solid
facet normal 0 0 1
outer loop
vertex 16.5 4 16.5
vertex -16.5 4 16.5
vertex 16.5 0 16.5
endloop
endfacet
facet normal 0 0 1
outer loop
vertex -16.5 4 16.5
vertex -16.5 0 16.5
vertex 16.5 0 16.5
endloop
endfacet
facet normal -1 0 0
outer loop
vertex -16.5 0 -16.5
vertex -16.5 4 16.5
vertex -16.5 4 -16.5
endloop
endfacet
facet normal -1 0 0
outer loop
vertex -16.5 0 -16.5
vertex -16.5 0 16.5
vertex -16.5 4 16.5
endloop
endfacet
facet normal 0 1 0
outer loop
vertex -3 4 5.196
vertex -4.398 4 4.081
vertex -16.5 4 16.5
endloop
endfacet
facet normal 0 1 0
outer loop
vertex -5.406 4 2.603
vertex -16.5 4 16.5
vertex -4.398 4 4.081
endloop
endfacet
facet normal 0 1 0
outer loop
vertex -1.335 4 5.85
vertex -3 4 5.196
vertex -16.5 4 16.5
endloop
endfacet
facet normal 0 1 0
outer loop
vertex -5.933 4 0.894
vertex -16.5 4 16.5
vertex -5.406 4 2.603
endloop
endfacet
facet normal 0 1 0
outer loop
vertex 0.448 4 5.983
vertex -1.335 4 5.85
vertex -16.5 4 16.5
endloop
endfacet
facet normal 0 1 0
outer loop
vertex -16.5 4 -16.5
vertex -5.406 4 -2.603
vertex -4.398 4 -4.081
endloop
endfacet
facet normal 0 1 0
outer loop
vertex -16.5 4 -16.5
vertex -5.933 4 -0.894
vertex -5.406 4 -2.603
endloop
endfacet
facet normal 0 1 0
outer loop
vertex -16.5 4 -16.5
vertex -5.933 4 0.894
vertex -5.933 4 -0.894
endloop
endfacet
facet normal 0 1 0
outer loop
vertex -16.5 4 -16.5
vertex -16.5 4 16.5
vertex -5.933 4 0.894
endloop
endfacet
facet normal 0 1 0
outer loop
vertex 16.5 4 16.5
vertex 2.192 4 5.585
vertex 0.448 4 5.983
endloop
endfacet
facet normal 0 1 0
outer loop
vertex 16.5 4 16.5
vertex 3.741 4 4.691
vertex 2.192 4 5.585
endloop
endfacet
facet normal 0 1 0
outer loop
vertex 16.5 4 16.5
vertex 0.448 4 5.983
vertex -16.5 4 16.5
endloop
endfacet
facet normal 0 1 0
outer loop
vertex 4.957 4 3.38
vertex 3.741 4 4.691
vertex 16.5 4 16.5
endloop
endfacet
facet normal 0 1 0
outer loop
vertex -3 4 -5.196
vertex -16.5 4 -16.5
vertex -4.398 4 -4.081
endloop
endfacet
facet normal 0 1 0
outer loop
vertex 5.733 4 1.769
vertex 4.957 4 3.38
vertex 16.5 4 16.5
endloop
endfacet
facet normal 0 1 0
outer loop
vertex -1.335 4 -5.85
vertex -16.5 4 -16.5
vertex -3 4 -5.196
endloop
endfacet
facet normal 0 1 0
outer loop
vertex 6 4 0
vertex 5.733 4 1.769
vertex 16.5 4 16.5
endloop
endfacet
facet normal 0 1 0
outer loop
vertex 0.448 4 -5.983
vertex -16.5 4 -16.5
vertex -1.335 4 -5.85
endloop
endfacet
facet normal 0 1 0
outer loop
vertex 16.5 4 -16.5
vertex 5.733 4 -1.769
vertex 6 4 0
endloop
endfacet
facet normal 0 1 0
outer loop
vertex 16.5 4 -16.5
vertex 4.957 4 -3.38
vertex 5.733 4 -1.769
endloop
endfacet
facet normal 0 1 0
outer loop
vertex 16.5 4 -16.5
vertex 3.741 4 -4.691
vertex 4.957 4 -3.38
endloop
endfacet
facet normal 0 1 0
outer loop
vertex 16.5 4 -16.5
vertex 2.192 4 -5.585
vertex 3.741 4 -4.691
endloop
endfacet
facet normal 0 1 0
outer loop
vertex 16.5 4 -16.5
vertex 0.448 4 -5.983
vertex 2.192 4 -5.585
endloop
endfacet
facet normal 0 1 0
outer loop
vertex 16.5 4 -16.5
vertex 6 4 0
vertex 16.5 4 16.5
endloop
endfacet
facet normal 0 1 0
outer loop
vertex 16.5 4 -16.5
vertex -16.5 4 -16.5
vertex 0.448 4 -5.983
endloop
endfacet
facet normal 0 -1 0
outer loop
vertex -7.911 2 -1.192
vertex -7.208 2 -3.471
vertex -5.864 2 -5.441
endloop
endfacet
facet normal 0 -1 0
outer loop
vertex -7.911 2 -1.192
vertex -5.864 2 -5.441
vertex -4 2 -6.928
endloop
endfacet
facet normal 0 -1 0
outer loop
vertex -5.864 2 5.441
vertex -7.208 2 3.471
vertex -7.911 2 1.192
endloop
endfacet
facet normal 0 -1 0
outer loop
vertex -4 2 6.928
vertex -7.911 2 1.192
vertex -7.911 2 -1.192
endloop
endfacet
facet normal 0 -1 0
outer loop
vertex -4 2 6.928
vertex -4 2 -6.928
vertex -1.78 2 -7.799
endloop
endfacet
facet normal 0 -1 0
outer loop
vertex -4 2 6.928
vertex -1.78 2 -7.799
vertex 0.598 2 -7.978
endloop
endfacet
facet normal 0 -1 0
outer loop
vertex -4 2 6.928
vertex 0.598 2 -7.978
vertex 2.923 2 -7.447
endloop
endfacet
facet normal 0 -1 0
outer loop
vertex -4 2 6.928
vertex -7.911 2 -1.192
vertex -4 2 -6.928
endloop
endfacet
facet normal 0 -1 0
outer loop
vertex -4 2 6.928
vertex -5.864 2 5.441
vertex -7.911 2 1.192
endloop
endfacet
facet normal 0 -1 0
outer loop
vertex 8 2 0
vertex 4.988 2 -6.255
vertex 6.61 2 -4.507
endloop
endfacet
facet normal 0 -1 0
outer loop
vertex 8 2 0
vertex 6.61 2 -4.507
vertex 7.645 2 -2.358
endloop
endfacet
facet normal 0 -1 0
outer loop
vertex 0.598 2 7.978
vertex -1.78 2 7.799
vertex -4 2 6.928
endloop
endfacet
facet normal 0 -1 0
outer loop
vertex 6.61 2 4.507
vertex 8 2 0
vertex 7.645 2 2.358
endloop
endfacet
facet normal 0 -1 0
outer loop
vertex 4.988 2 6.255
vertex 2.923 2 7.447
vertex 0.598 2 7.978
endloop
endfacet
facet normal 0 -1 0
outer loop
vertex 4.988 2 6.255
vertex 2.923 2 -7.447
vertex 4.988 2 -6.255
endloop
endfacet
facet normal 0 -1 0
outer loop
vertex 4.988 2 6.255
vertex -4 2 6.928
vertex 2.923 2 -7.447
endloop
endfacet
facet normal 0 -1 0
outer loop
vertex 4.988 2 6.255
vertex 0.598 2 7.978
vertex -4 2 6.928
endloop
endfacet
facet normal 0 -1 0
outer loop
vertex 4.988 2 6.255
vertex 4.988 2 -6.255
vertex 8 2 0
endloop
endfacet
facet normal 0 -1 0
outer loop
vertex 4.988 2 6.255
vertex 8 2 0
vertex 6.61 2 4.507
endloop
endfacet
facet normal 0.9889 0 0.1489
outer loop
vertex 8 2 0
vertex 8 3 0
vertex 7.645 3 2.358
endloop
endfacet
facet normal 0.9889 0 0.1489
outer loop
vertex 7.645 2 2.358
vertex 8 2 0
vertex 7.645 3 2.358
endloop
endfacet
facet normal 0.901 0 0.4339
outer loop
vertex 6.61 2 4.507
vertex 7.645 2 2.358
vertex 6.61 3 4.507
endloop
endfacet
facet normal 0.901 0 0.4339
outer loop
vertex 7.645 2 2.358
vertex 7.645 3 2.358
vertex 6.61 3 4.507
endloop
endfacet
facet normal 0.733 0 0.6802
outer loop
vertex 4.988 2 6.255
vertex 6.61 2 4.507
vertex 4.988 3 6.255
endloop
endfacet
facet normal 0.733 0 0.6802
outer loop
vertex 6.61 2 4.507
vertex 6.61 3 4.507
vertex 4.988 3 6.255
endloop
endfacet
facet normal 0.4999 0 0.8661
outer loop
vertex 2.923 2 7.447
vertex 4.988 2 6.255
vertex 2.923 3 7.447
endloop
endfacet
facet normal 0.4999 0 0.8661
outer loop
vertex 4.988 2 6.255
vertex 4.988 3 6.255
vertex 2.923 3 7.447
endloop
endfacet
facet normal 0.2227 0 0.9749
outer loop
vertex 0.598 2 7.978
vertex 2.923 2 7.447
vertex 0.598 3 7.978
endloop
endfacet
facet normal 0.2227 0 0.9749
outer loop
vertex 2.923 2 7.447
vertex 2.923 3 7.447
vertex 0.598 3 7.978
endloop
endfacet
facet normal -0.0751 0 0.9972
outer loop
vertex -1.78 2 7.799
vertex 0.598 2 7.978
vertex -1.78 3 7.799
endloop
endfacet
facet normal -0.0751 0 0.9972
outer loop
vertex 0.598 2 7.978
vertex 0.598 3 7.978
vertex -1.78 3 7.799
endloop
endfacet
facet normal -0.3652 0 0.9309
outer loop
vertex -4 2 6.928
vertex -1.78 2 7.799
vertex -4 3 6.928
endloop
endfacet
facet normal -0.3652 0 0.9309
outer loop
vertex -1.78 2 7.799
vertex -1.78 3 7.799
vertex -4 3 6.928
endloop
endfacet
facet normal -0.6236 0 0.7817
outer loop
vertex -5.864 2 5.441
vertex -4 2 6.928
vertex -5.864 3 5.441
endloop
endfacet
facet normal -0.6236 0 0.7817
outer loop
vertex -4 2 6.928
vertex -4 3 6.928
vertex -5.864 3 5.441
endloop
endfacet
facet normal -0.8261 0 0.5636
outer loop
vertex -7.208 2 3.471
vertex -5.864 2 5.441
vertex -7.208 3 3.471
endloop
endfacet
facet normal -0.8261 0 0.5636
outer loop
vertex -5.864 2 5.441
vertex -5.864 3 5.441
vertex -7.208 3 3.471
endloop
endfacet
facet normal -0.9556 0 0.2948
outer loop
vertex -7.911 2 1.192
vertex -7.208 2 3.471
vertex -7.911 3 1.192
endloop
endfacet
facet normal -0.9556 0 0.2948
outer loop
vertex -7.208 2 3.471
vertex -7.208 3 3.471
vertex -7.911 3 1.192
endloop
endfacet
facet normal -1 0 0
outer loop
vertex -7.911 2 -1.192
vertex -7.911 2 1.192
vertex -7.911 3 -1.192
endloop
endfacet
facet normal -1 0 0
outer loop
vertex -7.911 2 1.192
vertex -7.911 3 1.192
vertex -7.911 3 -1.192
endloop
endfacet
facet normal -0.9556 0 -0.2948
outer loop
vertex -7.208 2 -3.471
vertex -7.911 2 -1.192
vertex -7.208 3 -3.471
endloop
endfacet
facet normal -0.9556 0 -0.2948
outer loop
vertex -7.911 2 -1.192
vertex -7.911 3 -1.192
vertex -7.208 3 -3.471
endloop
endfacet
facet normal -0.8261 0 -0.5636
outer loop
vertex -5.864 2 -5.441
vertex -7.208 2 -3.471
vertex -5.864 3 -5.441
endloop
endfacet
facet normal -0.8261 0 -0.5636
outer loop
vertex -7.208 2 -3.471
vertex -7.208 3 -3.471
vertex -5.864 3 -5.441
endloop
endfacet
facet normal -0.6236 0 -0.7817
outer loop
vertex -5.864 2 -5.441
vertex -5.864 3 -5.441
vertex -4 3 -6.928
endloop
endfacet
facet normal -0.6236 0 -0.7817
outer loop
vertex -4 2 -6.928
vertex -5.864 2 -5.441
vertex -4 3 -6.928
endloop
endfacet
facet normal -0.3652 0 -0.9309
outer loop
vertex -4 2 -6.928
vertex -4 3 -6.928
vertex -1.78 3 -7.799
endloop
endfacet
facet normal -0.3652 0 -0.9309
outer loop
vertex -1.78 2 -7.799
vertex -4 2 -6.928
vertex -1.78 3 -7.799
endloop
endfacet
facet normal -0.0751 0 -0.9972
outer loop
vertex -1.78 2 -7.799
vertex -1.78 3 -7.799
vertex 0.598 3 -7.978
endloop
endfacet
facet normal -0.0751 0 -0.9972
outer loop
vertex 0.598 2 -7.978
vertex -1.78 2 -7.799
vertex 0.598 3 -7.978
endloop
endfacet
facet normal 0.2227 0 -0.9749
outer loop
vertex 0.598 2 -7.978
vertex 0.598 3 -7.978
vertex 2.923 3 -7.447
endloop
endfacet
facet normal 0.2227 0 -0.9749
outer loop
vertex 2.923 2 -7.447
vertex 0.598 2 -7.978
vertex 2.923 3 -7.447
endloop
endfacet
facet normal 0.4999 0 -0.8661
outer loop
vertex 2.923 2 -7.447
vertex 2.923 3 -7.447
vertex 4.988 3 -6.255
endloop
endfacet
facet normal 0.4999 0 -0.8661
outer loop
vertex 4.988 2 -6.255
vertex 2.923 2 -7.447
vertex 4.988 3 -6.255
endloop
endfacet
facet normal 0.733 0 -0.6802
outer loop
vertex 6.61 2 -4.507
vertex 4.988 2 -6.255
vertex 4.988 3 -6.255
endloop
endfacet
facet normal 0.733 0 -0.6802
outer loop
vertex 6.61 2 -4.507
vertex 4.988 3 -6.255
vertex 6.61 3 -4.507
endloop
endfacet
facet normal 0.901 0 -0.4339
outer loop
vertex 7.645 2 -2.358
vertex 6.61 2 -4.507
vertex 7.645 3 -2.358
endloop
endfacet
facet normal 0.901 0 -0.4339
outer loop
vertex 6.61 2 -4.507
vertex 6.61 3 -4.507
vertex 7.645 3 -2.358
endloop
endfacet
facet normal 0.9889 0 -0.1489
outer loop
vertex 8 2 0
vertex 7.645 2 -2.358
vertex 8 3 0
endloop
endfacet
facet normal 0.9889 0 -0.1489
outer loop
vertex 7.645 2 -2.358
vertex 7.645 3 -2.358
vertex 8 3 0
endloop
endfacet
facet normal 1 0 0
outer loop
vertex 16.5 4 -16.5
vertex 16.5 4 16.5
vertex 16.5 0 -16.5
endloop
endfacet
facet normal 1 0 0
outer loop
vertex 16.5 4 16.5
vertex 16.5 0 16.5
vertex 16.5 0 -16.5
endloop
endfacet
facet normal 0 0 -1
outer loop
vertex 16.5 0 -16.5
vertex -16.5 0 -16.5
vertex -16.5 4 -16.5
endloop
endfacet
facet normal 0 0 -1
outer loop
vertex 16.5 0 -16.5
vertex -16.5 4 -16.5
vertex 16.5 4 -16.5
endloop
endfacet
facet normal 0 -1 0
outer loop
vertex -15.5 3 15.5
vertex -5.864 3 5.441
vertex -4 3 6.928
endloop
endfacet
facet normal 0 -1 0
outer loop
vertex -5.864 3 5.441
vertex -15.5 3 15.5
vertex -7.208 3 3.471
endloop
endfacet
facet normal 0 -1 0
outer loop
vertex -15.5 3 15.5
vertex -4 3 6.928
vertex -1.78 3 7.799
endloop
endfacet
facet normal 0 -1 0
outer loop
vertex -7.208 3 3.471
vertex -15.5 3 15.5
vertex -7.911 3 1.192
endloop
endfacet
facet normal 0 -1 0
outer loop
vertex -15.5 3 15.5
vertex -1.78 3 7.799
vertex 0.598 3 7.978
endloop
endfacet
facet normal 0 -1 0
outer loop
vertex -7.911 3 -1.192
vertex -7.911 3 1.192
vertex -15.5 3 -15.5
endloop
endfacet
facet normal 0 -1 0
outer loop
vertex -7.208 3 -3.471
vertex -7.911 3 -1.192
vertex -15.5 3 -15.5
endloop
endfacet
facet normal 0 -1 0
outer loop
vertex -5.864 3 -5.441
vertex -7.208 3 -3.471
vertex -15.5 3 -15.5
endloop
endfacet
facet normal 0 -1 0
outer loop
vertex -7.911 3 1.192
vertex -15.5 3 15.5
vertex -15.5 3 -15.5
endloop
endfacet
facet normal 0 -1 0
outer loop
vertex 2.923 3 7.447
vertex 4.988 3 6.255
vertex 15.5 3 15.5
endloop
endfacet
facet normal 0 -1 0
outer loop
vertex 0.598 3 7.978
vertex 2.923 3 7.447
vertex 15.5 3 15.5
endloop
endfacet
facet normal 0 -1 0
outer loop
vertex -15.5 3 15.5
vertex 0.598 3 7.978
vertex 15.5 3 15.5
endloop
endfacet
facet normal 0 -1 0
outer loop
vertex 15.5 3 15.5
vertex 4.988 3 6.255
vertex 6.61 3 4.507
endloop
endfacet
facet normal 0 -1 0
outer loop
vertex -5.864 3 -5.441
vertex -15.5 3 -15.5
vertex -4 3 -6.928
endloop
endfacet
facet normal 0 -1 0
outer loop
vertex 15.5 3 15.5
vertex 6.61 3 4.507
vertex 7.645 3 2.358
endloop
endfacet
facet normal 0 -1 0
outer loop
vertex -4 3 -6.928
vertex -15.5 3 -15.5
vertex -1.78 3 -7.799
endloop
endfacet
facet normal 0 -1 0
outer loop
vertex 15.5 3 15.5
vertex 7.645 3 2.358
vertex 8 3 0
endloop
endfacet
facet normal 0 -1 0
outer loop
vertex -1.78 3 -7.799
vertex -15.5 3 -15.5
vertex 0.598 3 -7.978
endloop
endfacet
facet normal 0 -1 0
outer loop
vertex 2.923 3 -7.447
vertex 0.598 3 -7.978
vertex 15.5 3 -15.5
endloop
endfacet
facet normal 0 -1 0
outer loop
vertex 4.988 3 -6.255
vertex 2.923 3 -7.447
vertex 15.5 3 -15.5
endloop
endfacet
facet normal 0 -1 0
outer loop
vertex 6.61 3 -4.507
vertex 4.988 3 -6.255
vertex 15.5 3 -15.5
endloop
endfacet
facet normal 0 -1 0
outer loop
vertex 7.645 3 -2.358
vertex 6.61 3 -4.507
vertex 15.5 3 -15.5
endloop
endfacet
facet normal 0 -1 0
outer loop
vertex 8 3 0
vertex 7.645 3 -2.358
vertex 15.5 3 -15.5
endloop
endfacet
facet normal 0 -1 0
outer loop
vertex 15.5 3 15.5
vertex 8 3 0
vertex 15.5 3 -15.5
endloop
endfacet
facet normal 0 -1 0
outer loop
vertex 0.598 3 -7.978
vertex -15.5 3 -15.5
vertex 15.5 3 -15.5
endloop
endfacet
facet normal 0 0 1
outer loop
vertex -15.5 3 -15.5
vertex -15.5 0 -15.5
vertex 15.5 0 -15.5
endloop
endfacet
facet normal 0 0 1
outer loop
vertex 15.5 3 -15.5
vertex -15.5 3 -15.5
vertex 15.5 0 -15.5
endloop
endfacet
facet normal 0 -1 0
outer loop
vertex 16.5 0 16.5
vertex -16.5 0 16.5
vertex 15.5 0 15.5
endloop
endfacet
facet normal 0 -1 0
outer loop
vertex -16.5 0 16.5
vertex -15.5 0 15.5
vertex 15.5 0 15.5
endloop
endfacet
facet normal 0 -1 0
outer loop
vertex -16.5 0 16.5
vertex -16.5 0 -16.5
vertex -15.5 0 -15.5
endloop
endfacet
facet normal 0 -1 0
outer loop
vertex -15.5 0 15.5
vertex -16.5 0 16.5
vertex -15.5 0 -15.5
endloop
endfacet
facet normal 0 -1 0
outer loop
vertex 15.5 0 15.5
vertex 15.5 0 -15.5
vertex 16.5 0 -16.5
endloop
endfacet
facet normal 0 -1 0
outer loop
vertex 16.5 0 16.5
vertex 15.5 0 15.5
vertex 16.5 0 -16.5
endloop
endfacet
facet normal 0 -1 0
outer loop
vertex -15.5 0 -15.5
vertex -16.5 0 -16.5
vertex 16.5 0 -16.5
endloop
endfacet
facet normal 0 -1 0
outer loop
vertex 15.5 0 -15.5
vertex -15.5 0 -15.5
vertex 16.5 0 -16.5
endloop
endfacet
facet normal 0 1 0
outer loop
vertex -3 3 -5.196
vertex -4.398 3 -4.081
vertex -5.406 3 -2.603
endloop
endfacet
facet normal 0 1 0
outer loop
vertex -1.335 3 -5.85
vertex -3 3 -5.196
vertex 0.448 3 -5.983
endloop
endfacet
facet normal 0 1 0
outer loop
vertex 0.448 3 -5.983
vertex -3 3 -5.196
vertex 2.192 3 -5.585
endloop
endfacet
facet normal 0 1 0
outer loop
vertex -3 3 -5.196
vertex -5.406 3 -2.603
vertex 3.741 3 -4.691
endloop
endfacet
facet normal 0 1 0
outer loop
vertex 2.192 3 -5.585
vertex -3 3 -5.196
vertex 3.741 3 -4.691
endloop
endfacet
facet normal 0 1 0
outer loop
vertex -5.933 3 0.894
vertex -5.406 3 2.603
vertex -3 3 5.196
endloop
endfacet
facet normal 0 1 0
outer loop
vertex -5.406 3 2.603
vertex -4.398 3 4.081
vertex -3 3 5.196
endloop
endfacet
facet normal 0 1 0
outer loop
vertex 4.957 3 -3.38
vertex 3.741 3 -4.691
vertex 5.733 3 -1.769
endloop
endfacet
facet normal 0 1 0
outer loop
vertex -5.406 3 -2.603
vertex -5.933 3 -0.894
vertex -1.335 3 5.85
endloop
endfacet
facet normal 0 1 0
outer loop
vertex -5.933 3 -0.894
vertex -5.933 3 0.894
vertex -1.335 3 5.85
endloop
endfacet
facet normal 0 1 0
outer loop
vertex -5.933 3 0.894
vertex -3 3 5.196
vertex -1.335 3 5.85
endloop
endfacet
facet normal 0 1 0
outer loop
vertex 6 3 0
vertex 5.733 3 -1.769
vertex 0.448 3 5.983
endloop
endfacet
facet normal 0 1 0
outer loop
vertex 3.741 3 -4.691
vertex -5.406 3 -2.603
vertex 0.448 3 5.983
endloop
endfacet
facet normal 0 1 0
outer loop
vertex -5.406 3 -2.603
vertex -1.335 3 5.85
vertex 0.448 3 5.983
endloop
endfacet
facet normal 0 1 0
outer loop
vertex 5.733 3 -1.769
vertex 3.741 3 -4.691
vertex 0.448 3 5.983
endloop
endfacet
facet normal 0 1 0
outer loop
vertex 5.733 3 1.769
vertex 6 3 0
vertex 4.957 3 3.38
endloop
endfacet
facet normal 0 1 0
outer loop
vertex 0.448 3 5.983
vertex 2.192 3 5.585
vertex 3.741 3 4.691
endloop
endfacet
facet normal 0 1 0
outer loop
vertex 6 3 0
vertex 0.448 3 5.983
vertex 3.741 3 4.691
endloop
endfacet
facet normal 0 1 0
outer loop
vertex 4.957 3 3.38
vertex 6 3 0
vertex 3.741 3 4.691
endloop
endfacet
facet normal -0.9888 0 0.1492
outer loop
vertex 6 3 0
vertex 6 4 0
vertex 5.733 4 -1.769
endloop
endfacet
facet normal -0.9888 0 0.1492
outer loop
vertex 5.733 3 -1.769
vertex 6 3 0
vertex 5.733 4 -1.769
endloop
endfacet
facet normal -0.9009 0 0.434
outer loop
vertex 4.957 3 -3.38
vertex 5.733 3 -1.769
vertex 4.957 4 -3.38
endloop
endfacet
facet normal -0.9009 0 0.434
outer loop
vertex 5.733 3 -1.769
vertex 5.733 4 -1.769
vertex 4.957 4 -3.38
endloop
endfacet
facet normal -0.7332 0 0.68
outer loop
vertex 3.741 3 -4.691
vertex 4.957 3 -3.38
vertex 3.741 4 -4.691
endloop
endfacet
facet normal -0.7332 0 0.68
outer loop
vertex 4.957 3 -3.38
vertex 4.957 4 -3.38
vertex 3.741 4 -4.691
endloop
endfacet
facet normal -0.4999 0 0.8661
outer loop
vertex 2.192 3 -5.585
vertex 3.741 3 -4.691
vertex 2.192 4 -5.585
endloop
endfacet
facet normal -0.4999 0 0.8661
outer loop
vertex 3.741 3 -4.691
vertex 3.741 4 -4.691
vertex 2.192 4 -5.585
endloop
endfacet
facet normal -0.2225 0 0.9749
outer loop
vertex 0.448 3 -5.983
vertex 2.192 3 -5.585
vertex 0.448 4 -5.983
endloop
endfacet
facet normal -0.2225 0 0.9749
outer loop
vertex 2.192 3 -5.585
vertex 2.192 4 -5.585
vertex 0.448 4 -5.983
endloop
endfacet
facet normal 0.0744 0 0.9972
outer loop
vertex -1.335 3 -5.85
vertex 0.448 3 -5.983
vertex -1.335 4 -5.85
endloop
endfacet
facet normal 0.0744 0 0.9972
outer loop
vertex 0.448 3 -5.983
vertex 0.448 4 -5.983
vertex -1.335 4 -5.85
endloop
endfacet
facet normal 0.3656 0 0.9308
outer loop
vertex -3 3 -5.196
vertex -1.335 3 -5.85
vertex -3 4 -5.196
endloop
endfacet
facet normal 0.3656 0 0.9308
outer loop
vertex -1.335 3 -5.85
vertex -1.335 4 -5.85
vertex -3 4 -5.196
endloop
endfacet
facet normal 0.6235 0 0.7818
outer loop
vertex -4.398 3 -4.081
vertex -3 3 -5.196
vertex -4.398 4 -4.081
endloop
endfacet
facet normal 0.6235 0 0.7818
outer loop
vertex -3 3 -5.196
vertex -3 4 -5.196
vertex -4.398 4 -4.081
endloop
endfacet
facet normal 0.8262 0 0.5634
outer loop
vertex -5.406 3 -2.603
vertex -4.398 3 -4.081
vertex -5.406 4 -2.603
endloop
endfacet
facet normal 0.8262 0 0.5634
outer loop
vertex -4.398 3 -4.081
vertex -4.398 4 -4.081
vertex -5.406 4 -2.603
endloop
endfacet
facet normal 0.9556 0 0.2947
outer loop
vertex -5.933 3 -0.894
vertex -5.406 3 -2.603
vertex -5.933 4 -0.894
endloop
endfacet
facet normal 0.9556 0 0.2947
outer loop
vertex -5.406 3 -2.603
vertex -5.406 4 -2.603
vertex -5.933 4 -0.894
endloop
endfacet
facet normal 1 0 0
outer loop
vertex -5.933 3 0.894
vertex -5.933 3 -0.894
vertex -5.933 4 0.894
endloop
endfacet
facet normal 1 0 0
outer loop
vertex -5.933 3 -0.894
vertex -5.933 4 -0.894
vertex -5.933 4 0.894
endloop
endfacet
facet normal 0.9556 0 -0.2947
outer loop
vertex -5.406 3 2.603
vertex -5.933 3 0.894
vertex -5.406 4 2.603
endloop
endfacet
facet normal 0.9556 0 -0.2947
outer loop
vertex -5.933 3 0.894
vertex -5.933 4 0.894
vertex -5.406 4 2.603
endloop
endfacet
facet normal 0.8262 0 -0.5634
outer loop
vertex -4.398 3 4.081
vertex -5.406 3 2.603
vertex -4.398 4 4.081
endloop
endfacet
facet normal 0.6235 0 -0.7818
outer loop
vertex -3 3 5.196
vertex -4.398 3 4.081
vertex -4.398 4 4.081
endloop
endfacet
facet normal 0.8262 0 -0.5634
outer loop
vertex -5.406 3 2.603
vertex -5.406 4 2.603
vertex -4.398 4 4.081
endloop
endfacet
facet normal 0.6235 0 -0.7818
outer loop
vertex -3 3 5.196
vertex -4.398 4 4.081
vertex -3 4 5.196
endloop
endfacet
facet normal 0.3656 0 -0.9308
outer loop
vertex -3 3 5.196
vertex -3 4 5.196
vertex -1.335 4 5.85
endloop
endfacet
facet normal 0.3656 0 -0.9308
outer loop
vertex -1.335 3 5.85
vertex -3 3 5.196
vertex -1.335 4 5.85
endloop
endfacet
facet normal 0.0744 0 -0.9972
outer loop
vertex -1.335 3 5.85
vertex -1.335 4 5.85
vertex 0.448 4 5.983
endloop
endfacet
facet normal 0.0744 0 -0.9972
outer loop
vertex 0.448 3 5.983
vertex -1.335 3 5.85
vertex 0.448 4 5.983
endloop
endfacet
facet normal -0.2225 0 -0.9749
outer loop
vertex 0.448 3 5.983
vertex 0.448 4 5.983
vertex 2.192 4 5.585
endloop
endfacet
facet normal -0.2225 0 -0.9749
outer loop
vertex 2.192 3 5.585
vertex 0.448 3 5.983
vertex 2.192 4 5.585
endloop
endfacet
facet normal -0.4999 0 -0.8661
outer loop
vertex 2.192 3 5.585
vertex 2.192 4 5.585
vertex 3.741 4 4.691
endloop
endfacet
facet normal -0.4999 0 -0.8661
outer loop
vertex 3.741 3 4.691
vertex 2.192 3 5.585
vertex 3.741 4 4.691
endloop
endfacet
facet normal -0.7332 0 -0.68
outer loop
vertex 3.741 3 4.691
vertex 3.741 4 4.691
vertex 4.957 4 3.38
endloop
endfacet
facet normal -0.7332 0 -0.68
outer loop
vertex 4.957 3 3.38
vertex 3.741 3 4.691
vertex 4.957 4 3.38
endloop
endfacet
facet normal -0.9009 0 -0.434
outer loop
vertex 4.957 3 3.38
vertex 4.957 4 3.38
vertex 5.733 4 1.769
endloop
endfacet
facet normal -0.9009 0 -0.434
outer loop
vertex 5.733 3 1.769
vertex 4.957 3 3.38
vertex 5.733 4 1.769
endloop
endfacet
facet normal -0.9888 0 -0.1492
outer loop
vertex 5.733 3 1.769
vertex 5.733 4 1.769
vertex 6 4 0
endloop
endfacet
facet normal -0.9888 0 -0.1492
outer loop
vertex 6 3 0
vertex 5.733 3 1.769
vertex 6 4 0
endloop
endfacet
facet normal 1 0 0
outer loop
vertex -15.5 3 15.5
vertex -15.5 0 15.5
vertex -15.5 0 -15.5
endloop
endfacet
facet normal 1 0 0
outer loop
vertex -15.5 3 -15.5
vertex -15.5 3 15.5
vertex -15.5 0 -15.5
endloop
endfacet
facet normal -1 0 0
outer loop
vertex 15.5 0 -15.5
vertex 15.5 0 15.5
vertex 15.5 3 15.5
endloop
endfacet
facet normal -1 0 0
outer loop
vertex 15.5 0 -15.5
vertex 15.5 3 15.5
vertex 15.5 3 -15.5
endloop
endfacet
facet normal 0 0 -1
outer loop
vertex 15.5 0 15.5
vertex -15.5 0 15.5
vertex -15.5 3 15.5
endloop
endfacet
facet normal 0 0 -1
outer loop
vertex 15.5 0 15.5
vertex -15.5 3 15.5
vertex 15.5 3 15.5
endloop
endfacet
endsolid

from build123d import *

# Parameters (mm, degrees)
SKETCH1_W           = 33
SKETCH1_H           = 33
SKETCH1_W_2         = 31
SKETCH1_H_2         = 31
BOSS_EXTRUDE1_DEPTH = 3
SKETCH2_W           = 33
SKETCH2_H           = 33
BOSS_EXTRUDE2_DEPTH = 1
SKETCH3_R           = 6
CUT_EXTRUDE1_DEPTH  = 5
SKETCH4_R           = 8
BOSS_EXTRUDE3_DEPTH = 1


with BuildPart() as part:
    # Sketch1 → Boss-Extrude1 (new body)
    with BuildSketch(Plane(origin=(0, 0, 0), x_dir=(1, 0, 0), z_dir=(0, 1, 0))):
        Rectangle(SKETCH1_W, SKETCH1_H)
        Rectangle(SKETCH1_W_2, SKETCH1_H_2, mode=Mode.SUBTRACT)
    extrude(amount=BOSS_EXTRUDE1_DEPTH)

    # Sketch2 → Boss-Extrude2 (add)
    with BuildSketch(Plane(origin=(0, 3, 0), x_dir=(1, 0, 0), z_dir=(0, 1, 0))):
        Rectangle(SKETCH2_W, SKETCH2_H)
    extrude(amount=BOSS_EXTRUDE2_DEPTH)

    # Sketch3 → Cut-Extrude1 (cut, through all)
    with BuildSketch(Plane(origin=(0, 4, 0), x_dir=(1, 0, 0), z_dir=(0, 1, 0))):
        Circle(SKETCH3_R)
    extrude(amount=-CUT_EXTRUDE1_DEPTH, mode=Mode.SUBTRACT)

    # Sketch4 → Boss-Extrude3 (add)
    with BuildSketch(Plane.XZ.offset(-3)):
        Circle(SKETCH4_R)
    extrude(amount=BOSS_EXTRUDE3_DEPTH)


solid = part.part
